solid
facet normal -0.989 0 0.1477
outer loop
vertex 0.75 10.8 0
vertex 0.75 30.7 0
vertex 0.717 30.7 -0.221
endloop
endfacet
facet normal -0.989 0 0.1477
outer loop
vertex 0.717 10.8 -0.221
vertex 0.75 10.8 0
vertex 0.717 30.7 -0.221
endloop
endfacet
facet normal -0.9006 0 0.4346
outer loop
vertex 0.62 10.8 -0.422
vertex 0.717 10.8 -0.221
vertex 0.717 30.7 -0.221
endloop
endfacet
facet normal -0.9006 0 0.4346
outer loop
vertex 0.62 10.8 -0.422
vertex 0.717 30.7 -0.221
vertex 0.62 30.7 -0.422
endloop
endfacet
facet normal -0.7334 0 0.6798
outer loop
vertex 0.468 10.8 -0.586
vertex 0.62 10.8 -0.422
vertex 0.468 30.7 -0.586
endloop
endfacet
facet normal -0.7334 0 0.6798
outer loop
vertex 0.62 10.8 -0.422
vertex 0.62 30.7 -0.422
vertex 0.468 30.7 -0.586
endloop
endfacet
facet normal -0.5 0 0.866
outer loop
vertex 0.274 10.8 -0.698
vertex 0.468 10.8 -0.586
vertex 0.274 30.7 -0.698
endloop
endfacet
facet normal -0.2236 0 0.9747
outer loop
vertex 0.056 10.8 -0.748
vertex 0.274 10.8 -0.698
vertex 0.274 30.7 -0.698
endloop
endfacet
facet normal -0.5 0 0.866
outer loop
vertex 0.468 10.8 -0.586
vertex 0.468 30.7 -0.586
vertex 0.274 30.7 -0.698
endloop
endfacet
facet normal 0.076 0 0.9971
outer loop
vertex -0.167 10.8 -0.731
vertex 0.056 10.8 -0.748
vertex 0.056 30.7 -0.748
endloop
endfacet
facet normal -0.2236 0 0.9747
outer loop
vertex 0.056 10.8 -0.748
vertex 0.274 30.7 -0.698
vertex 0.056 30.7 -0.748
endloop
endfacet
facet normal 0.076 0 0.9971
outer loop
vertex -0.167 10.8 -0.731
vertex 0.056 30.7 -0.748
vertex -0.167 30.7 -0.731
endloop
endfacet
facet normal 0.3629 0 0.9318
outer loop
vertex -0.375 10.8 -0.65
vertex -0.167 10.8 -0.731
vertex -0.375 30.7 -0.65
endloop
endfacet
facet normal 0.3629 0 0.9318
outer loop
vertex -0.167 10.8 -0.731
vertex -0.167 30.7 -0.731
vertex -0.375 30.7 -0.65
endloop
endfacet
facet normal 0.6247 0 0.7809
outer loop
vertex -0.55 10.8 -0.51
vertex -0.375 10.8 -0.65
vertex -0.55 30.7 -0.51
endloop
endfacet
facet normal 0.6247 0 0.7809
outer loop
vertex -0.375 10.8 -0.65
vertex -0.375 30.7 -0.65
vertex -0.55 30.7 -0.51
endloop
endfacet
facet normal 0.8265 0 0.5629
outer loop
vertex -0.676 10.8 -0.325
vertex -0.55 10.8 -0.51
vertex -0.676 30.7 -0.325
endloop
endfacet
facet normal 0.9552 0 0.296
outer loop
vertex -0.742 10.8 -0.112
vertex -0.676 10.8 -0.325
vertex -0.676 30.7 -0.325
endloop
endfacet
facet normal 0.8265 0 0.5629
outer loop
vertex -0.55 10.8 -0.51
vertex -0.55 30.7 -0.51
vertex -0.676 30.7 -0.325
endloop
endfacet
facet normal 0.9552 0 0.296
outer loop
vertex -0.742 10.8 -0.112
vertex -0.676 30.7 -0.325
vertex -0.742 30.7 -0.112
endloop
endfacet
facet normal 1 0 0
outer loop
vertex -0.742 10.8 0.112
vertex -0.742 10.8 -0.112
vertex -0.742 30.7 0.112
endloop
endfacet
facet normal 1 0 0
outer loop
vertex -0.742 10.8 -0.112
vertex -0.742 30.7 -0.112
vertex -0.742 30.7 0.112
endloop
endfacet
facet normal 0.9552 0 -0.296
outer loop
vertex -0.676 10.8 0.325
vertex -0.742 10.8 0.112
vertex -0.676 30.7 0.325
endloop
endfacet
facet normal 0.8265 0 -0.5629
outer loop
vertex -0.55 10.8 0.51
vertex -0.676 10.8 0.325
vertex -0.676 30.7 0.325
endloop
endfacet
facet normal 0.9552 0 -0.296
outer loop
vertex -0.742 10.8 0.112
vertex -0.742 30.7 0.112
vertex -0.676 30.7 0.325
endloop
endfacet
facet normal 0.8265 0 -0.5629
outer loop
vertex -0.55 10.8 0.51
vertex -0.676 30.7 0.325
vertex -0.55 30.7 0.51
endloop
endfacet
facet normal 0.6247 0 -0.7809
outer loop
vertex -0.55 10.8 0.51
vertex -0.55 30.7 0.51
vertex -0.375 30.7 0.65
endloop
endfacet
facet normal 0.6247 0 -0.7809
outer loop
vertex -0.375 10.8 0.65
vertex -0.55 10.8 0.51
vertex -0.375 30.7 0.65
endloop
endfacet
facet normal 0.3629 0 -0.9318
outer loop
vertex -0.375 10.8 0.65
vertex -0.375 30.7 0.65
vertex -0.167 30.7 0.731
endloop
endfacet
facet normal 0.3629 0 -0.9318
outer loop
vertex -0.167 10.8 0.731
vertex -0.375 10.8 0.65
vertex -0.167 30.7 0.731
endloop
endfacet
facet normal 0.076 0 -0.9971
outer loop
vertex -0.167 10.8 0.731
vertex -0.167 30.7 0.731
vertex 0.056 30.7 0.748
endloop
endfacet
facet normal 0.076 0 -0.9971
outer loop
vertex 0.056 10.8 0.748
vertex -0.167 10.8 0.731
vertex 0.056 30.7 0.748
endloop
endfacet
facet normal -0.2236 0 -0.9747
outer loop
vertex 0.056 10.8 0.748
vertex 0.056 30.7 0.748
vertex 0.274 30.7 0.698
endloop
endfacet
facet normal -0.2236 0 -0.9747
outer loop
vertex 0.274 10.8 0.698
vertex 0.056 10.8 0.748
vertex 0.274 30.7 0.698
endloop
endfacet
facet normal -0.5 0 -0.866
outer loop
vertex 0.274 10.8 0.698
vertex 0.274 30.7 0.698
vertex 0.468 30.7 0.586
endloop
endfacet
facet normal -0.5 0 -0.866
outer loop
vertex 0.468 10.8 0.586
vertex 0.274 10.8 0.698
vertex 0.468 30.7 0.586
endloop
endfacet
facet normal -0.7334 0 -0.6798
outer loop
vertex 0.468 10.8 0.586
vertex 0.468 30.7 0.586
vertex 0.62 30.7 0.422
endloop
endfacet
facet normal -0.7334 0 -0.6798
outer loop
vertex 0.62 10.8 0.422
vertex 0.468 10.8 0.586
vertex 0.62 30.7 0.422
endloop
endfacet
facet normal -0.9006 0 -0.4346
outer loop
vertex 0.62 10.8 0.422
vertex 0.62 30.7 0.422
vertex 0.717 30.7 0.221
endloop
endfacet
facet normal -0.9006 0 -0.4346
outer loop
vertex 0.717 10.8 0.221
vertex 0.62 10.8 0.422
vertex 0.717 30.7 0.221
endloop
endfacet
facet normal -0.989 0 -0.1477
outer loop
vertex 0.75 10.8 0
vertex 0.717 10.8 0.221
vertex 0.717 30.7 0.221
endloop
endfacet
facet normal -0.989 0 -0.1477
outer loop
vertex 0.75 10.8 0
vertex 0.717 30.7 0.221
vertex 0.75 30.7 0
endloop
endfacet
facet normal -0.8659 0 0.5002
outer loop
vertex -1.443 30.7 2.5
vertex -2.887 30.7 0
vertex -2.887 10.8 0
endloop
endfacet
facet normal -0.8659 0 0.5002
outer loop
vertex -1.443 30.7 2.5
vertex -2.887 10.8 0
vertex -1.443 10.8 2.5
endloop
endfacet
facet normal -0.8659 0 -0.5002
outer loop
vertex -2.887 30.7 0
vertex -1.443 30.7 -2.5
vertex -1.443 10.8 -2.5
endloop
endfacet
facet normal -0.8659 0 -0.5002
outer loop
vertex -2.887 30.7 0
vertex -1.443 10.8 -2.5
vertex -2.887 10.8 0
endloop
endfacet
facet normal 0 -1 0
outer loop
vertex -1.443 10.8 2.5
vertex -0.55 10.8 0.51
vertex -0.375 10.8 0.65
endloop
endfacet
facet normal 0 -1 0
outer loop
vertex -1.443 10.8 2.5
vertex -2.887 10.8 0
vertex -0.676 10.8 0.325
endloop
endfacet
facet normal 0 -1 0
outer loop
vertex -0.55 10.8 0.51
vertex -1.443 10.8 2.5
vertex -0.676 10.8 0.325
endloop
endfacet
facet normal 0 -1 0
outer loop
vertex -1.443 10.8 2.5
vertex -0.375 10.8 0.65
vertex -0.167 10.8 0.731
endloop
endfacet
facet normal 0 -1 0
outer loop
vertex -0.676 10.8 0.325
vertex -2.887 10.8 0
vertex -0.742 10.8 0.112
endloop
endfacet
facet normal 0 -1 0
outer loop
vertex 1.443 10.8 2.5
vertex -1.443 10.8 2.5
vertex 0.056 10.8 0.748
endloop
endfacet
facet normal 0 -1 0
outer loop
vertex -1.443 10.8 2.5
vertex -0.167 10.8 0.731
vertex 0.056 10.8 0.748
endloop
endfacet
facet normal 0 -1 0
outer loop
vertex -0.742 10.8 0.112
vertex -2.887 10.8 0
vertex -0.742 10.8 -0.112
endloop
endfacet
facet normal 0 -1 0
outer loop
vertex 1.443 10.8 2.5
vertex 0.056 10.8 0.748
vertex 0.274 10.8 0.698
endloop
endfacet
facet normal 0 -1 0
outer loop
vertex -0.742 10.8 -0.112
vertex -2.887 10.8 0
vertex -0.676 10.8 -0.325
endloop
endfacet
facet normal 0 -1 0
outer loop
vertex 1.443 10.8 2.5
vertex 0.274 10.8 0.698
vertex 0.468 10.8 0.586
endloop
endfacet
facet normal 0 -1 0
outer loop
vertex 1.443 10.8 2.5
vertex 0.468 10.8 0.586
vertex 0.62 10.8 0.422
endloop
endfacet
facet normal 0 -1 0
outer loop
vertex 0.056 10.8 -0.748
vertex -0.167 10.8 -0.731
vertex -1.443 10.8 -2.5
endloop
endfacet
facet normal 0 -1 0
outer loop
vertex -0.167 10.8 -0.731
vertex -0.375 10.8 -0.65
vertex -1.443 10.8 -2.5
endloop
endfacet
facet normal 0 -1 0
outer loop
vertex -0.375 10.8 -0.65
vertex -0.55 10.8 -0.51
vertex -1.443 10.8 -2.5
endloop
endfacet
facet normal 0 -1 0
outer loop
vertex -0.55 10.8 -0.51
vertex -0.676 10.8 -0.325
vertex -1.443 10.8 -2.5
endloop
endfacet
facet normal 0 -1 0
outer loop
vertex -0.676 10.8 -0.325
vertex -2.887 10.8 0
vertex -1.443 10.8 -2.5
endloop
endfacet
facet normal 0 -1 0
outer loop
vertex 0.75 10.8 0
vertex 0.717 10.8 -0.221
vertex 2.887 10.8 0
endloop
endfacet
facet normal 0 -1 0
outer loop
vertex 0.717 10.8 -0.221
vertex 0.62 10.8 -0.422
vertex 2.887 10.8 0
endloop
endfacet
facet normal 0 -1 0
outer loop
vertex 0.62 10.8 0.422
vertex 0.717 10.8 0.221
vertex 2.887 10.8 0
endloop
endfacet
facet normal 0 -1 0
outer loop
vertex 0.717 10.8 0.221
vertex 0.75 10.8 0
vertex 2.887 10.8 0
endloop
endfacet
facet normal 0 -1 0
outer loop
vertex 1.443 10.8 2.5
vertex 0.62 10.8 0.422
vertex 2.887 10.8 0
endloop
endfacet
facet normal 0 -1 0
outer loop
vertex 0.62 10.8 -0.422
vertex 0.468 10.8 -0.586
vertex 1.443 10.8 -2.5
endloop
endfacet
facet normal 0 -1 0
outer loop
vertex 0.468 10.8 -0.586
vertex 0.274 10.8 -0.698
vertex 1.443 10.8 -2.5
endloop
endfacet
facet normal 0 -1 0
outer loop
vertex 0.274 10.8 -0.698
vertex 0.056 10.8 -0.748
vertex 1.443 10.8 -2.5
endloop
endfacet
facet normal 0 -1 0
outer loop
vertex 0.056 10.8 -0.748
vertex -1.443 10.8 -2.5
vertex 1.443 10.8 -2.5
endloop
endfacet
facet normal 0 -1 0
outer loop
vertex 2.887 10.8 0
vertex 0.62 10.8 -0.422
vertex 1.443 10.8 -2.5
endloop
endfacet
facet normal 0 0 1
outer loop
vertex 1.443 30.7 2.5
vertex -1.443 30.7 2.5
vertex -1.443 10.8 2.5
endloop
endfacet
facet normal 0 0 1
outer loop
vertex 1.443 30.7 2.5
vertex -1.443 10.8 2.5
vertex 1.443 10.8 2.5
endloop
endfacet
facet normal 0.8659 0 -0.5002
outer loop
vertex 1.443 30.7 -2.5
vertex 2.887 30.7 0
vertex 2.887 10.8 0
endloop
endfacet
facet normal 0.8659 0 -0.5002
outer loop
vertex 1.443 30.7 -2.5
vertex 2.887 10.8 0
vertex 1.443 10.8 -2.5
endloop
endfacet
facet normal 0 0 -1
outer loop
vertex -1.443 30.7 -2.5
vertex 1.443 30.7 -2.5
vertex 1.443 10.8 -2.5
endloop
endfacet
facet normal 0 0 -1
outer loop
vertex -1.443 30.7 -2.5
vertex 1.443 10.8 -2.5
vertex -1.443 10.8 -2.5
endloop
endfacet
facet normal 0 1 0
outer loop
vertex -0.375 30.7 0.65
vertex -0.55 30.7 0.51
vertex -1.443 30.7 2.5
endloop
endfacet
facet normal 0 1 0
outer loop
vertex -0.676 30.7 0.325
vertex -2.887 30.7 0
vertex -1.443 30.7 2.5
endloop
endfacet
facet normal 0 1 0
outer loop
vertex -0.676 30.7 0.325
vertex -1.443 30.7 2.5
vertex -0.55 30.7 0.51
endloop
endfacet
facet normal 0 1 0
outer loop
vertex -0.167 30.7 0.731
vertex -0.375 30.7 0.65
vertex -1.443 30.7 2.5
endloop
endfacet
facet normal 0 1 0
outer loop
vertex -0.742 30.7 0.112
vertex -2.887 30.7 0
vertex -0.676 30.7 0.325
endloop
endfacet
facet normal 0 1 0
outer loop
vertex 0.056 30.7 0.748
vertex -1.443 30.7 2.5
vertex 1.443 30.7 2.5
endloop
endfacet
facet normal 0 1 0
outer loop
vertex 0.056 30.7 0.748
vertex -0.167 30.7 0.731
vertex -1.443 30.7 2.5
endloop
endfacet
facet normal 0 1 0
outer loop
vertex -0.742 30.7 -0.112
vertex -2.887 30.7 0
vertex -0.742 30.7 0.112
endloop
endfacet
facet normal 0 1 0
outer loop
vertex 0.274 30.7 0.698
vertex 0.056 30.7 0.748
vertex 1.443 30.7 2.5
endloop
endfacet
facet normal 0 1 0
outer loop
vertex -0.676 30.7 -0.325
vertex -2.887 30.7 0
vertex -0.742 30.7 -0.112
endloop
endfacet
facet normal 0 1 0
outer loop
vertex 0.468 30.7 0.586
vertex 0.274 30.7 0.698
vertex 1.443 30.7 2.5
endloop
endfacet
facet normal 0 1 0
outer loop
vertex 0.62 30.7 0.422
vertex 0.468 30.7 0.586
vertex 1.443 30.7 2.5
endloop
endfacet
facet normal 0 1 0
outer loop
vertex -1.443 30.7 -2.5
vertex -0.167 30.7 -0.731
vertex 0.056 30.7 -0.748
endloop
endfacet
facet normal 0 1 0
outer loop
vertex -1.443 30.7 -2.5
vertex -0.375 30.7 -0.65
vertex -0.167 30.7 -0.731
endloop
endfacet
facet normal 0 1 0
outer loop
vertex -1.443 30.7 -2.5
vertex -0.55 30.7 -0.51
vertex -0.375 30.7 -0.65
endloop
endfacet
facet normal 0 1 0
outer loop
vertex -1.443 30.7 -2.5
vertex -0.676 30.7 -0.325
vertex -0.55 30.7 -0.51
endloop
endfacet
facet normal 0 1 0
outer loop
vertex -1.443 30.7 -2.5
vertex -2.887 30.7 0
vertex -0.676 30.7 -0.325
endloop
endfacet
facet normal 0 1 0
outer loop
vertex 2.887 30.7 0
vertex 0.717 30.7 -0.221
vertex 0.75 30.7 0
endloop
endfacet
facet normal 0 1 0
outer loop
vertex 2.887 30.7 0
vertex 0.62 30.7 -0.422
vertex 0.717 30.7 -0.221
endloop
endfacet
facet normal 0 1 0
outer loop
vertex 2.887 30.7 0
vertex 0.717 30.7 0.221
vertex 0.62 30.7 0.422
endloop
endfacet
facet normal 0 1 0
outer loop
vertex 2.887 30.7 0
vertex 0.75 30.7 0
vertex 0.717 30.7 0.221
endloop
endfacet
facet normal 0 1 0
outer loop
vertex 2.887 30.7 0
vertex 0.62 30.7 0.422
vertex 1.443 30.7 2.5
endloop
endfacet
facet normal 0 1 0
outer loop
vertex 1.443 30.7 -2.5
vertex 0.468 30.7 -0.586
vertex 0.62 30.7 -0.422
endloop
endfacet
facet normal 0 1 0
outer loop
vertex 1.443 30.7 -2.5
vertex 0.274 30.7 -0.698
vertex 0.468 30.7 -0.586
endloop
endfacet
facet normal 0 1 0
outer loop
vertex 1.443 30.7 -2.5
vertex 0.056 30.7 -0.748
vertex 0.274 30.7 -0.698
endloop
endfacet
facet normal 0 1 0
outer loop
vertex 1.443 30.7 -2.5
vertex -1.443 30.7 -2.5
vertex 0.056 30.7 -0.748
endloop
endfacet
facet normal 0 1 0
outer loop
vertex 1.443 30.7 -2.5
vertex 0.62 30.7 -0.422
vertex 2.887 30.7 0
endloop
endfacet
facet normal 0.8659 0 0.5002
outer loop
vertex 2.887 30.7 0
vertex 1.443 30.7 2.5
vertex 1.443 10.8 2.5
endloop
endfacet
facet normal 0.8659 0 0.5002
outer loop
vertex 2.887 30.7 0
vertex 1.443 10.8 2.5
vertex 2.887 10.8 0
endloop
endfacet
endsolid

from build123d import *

# Parameters (mm, degrees)
EXTRUDE_START       = 10.8
EXTRUDE_1_DEPTH     = 19.9
SKETCH_2_R          = 0.75
CUT_EXTRUDE_1_DEPTH = 20.9


with BuildPart() as part:
    # Эскиз1 → Бобышка-Вытянуть1 (new body)
    with BuildSketch(Plane(origin=(0, 0, 0), x_dir=(1, 0, 0), z_dir=(0, 1, 0)).offset(EXTRUDE_START)):
        Polygon((2.886751346, 0), (1.443375673, 2.5), (-1.443375673, 2.5), (-2.886751346, 0), (-1.443375673, -2.5), (1.443375673, -2.5), align=None)
    extrude(amount=EXTRUDE_1_DEPTH)

    # Эскиз2 → Вырез-Вытянуть1 (cut, through all)
    with BuildSketch(Plane(origin=(0, 30.7, 0), x_dir=(1, 0, 0), z_dir=(0, 1, 0))):
        Circle(SKETCH_2_R)
    extrude(amount=-CUT_EXTRUDE_1_DEPTH, mode=Mode.SUBTRACT)


solid = part.part
